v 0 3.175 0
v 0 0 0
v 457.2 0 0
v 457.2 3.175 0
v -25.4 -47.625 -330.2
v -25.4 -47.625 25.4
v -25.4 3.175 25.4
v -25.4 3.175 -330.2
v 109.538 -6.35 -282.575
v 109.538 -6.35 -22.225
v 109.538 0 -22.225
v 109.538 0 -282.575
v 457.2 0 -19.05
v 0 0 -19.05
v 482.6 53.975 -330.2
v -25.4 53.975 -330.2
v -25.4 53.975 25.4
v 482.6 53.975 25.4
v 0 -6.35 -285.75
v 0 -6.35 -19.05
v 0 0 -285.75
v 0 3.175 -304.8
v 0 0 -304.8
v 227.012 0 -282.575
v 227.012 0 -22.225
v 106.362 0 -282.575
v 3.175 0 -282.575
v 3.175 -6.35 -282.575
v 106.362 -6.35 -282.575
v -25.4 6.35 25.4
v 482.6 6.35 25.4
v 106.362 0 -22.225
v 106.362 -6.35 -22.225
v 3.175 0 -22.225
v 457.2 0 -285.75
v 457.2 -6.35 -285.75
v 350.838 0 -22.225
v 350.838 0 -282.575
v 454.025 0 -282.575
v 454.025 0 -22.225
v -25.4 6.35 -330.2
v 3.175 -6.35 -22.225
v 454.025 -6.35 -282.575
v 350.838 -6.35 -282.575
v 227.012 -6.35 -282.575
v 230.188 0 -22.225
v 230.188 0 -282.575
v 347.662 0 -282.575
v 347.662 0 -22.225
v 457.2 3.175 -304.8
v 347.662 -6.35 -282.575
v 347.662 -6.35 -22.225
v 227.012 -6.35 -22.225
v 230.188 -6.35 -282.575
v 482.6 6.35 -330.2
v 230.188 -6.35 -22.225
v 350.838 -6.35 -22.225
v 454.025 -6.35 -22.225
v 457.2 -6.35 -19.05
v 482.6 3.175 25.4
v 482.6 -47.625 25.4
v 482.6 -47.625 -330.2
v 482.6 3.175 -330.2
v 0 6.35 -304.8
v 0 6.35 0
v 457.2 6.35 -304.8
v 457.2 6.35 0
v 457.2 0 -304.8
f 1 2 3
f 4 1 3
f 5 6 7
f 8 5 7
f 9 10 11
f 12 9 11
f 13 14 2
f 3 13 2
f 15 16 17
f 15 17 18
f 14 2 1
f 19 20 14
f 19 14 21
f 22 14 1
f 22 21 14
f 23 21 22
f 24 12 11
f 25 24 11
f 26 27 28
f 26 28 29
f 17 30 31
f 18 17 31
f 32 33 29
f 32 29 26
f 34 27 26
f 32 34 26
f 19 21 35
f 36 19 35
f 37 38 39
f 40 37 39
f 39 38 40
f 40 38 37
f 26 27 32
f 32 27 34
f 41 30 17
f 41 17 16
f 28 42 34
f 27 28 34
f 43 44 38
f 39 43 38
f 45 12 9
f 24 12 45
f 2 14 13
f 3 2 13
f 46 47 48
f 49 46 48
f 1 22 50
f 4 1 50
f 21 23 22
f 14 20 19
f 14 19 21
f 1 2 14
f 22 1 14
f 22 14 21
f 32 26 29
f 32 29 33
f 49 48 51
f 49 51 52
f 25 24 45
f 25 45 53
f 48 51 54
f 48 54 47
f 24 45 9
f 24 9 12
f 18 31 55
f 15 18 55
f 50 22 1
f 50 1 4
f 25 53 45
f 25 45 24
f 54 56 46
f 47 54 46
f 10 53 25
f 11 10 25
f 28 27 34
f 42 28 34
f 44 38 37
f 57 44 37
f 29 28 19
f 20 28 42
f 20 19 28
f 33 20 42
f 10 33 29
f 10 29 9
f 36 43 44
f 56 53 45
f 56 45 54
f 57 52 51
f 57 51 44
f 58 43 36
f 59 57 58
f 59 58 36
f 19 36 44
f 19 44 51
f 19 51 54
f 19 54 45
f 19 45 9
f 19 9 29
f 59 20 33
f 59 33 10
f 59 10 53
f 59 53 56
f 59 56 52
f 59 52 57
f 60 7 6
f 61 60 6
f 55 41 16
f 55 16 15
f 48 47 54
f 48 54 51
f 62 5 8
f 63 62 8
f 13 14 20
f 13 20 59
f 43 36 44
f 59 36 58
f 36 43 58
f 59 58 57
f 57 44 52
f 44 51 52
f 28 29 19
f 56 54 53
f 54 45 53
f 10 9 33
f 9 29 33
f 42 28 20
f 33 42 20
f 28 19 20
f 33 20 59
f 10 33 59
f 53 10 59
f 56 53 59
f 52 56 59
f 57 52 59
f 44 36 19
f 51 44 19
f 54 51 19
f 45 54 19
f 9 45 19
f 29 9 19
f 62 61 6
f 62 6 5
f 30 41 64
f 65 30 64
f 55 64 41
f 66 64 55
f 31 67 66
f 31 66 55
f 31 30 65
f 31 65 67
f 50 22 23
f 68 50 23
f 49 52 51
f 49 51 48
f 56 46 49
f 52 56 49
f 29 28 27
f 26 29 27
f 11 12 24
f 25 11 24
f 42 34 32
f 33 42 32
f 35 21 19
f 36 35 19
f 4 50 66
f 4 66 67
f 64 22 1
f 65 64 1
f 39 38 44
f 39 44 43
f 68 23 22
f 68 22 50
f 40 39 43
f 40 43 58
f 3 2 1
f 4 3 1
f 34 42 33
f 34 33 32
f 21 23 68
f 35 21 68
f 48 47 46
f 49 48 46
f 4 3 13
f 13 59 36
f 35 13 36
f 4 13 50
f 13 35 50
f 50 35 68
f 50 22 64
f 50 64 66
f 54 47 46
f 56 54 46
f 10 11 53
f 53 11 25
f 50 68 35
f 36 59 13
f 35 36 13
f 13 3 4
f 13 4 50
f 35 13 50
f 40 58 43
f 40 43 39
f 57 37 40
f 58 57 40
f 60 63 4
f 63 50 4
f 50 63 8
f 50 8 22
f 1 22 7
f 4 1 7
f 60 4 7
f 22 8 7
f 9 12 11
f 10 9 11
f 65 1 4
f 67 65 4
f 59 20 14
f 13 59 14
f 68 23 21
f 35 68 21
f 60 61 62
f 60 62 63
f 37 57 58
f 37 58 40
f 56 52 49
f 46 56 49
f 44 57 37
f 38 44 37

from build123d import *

# Parameters (mm, degrees)
SKETCH1_W                  = 457.2
SKETCH1_H                  = 304.8
BOSS_EXTRUDE1_DEPTH        = 3.175
SKETCH2_W                  = 457.2
SKETCH2_H                  = 266.7
SKETCH2_W_2                = 117.475
SKETCH2_H_2                = 260.35
SKETCH2_W_3                = 103.1875
BOSS_EXTRUDE2_DEPTH        = 6.35
TOOLING_START              = 3.175
TOOLING_SPLIT1_OUTLINE_W   = 508
TOOLING_SPLIT1_OUTLINE_H   = 355.6
TOOLING_SPLIT1_DEPTH       = 50.8
TOOLING_START_2            = -25.4
TOOLING_SPLIT1_2_DEPTH     = 508
TOOLING_START_3            = 109.5375
TOOLING_SPLIT1_3_OUTLINE_W = 6.35
TOOLING_SPLIT1_3_OUTLINE_H = 260.35
TOOLING_SPLIT1_3_DEPTH     = 117.475
TOOLING_START_4            = 230.1875
TOOLING_SPLIT1_4_OUTLINE_W = 6.35
TOOLING_SPLIT1_4_OUTLINE_H = 260.35
TOOLING_SPLIT1_4_DEPTH     = 117.475
TOOLING_SPLIT1_5_OUTLINE_W = 6.35
TOOLING_SPLIT1_5_OUTLINE_H = 260.35
TOOLING_SPLIT1_5_DEPTH     = 103.1875
TOOLING_START_5            = 350.8375
TOOLING_SPLIT1_6_OUTLINE_W = 6.35
TOOLING_SPLIT1_6_OUTLINE_H = 260.35
TOOLING_SPLIT1_6_DEPTH     = 103.1875
TOOLING_SPLIT1_7_DEPTH     = 25.4
TOOLING_START_6            = 457.2
TOOLING_SPLIT1_8_DEPTH     = 25.4
SKETCH6_W                  = 508
SKETCH6_H                  = 355.6
SKETCH6_W_2                = 457.2
SKETCH6_H_2                = 304.8
CUT_EXTRUDE1_DEPTH         = 3.175


# Read off the part's stored shape, not the designer's step: Tooling Split1
with BuildPart() as part:
    # Sketch1 → Boss-Extrude1 (new body)
    with BuildSketch(Plane(origin=(0, 0, 0), x_dir=(1, 0, 0), z_dir=(0, 1, 0))):
        with Locations((228.6, 152.4)):
            Rectangle(SKETCH1_W, SKETCH1_H)
    extrude(amount=BOSS_EXTRUDE1_DEPTH)

    # Sketch2 → Boss-Extrude2 (add)
    with BuildSketch(Plane.XZ):
        with Locations((228.6, -152.4)):
            Rectangle(SKETCH2_W, SKETCH2_H)
        with Locations((168.275, -152.4)):
            Rectangle(SKETCH2_W_2, SKETCH2_H_2, mode=Mode.SUBTRACT)
        with Locations((54.76875, -152.4)):
            Rectangle(SKETCH2_W_3, SKETCH2_H_2, mode=Mode.SUBTRACT)
        with Locations((402.43125, -152.4)):
            Rectangle(SKETCH2_W_3, SKETCH2_H_2, mode=Mode.SUBTRACT)
        with Locations((288.925, -152.4)):
            Rectangle(SKETCH2_W_2, SKETCH2_H_2, mode=Mode.SUBTRACT)
    extrude(amount=BOSS_EXTRUDE2_DEPTH)


with BuildPart() as body_2:
    # Tooling Split1 outline → Tooling Split1 (new body)
    with BuildSketch(Plane(origin=(0, 0, 0), x_dir=(1, 0, 0), z_dir=(0, 1, 0)).offset(TOOLING_START)):
        with Locations((228.6, 152.4)):
            Rectangle(TOOLING_SPLIT1_OUTLINE_W, TOOLING_SPLIT1_OUTLINE_H)
    extrude(amount=TOOLING_SPLIT1_DEPTH)

    # Sketch6 → Cut-Extrude1 (cut)
    with BuildSketch(Plane.XZ.offset(-3.175)):
        with Locations((228.6, -152.4)):
            Rectangle(SKETCH6_W, SKETCH6_H)
        with Locations((228.6, -152.4)):
            Rectangle(SKETCH6_W_2, SKETCH6_H_2, mode=Mode.SUBTRACT)
    extrude(amount=-CUT_EXTRUDE1_DEPTH, mode=Mode.SUBTRACT)


with BuildPart() as body_3:
    # Tooling Split1 2 outline → Tooling Split1 2 (new body)
    with BuildSketch(Plane.YZ.offset(TOOLING_START_2)):
        Polygon((3.175, 0), (3.175, 25.4), (-47.625, 25.4), (-47.625, -330.2), (3.175, -330.2), (3.175, -304.8), (0, -304.8), (0, -285.75), (-6.35, -285.75), (-6.35, -19.05), (0, -19.05), (0, 0), align=None)
    extrude(amount=TOOLING_SPLIT1_2_DEPTH)

    # Tooling Split1 3 outline → Tooling Split1 3 (add)
    with BuildSketch(Plane.YZ.offset(TOOLING_START_3)):
        with Locations((-3.175, -152.4)):
            Rectangle(TOOLING_SPLIT1_3_OUTLINE_W, TOOLING_SPLIT1_3_OUTLINE_H)
    extrude(amount=TOOLING_SPLIT1_3_DEPTH)

    # Tooling Split1 4 outline → Tooling Split1 4 (add)
    with BuildSketch(Plane.YZ.offset(TOOLING_START_4)):
        with Locations((-3.175, -152.4)):
            Rectangle(TOOLING_SPLIT1_4_OUTLINE_W, TOOLING_SPLIT1_4_OUTLINE_H)
    extrude(amount=TOOLING_SPLIT1_4_DEPTH)

    # Tooling Split1 5 outline → Tooling Split1 5 (add)
    with BuildSketch(Plane.YZ.offset(TOOLING_START)):
        with Locations((-3.175, -152.4)):
            Rectangle(TOOLING_SPLIT1_5_OUTLINE_W, TOOLING_SPLIT1_5_OUTLINE_H)
    extrude(amount=TOOLING_SPLIT1_5_DEPTH)

    # Tooling Split1 6 outline → Tooling Split1 6 (add)
    with BuildSketch(Plane.YZ.offset(TOOLING_START_5)):
        with Locations((-3.175, -152.4)):
            Rectangle(TOOLING_SPLIT1_6_OUTLINE_W, TOOLING_SPLIT1_6_OUTLINE_H)
    extrude(amount=TOOLING_SPLIT1_6_DEPTH)

    # Tooling Split1 7 outline → Tooling Split1 7 (add)
    with BuildSketch(Plane.YZ.offset(TOOLING_START_2)):
        Polygon((3.175, -304.8), (3.175, 0), (0, 0), (0, -19.05), (-6.35, -19.05), (-6.35, -285.75), (0, -285.75), (0, -304.8), align=None)
    extrude(amount=TOOLING_SPLIT1_7_DEPTH)

    # Tooling Split1 8 outline → Tooling Split1 8 (add)
    with BuildSketch(Plane.YZ.offset(TOOLING_START_6)):
        Polygon((3.175, -304.8), (3.175, 0), (0, 0), (0, -19.05), (-6.35, -19.05), (-6.35, -285.75), (0, -285.75), (0, -304.8), align=None)
    extrude(amount=TOOLING_SPLIT1_8_DEPTH)


solid = Compound([part.part, body_2.part, body_3.part])
